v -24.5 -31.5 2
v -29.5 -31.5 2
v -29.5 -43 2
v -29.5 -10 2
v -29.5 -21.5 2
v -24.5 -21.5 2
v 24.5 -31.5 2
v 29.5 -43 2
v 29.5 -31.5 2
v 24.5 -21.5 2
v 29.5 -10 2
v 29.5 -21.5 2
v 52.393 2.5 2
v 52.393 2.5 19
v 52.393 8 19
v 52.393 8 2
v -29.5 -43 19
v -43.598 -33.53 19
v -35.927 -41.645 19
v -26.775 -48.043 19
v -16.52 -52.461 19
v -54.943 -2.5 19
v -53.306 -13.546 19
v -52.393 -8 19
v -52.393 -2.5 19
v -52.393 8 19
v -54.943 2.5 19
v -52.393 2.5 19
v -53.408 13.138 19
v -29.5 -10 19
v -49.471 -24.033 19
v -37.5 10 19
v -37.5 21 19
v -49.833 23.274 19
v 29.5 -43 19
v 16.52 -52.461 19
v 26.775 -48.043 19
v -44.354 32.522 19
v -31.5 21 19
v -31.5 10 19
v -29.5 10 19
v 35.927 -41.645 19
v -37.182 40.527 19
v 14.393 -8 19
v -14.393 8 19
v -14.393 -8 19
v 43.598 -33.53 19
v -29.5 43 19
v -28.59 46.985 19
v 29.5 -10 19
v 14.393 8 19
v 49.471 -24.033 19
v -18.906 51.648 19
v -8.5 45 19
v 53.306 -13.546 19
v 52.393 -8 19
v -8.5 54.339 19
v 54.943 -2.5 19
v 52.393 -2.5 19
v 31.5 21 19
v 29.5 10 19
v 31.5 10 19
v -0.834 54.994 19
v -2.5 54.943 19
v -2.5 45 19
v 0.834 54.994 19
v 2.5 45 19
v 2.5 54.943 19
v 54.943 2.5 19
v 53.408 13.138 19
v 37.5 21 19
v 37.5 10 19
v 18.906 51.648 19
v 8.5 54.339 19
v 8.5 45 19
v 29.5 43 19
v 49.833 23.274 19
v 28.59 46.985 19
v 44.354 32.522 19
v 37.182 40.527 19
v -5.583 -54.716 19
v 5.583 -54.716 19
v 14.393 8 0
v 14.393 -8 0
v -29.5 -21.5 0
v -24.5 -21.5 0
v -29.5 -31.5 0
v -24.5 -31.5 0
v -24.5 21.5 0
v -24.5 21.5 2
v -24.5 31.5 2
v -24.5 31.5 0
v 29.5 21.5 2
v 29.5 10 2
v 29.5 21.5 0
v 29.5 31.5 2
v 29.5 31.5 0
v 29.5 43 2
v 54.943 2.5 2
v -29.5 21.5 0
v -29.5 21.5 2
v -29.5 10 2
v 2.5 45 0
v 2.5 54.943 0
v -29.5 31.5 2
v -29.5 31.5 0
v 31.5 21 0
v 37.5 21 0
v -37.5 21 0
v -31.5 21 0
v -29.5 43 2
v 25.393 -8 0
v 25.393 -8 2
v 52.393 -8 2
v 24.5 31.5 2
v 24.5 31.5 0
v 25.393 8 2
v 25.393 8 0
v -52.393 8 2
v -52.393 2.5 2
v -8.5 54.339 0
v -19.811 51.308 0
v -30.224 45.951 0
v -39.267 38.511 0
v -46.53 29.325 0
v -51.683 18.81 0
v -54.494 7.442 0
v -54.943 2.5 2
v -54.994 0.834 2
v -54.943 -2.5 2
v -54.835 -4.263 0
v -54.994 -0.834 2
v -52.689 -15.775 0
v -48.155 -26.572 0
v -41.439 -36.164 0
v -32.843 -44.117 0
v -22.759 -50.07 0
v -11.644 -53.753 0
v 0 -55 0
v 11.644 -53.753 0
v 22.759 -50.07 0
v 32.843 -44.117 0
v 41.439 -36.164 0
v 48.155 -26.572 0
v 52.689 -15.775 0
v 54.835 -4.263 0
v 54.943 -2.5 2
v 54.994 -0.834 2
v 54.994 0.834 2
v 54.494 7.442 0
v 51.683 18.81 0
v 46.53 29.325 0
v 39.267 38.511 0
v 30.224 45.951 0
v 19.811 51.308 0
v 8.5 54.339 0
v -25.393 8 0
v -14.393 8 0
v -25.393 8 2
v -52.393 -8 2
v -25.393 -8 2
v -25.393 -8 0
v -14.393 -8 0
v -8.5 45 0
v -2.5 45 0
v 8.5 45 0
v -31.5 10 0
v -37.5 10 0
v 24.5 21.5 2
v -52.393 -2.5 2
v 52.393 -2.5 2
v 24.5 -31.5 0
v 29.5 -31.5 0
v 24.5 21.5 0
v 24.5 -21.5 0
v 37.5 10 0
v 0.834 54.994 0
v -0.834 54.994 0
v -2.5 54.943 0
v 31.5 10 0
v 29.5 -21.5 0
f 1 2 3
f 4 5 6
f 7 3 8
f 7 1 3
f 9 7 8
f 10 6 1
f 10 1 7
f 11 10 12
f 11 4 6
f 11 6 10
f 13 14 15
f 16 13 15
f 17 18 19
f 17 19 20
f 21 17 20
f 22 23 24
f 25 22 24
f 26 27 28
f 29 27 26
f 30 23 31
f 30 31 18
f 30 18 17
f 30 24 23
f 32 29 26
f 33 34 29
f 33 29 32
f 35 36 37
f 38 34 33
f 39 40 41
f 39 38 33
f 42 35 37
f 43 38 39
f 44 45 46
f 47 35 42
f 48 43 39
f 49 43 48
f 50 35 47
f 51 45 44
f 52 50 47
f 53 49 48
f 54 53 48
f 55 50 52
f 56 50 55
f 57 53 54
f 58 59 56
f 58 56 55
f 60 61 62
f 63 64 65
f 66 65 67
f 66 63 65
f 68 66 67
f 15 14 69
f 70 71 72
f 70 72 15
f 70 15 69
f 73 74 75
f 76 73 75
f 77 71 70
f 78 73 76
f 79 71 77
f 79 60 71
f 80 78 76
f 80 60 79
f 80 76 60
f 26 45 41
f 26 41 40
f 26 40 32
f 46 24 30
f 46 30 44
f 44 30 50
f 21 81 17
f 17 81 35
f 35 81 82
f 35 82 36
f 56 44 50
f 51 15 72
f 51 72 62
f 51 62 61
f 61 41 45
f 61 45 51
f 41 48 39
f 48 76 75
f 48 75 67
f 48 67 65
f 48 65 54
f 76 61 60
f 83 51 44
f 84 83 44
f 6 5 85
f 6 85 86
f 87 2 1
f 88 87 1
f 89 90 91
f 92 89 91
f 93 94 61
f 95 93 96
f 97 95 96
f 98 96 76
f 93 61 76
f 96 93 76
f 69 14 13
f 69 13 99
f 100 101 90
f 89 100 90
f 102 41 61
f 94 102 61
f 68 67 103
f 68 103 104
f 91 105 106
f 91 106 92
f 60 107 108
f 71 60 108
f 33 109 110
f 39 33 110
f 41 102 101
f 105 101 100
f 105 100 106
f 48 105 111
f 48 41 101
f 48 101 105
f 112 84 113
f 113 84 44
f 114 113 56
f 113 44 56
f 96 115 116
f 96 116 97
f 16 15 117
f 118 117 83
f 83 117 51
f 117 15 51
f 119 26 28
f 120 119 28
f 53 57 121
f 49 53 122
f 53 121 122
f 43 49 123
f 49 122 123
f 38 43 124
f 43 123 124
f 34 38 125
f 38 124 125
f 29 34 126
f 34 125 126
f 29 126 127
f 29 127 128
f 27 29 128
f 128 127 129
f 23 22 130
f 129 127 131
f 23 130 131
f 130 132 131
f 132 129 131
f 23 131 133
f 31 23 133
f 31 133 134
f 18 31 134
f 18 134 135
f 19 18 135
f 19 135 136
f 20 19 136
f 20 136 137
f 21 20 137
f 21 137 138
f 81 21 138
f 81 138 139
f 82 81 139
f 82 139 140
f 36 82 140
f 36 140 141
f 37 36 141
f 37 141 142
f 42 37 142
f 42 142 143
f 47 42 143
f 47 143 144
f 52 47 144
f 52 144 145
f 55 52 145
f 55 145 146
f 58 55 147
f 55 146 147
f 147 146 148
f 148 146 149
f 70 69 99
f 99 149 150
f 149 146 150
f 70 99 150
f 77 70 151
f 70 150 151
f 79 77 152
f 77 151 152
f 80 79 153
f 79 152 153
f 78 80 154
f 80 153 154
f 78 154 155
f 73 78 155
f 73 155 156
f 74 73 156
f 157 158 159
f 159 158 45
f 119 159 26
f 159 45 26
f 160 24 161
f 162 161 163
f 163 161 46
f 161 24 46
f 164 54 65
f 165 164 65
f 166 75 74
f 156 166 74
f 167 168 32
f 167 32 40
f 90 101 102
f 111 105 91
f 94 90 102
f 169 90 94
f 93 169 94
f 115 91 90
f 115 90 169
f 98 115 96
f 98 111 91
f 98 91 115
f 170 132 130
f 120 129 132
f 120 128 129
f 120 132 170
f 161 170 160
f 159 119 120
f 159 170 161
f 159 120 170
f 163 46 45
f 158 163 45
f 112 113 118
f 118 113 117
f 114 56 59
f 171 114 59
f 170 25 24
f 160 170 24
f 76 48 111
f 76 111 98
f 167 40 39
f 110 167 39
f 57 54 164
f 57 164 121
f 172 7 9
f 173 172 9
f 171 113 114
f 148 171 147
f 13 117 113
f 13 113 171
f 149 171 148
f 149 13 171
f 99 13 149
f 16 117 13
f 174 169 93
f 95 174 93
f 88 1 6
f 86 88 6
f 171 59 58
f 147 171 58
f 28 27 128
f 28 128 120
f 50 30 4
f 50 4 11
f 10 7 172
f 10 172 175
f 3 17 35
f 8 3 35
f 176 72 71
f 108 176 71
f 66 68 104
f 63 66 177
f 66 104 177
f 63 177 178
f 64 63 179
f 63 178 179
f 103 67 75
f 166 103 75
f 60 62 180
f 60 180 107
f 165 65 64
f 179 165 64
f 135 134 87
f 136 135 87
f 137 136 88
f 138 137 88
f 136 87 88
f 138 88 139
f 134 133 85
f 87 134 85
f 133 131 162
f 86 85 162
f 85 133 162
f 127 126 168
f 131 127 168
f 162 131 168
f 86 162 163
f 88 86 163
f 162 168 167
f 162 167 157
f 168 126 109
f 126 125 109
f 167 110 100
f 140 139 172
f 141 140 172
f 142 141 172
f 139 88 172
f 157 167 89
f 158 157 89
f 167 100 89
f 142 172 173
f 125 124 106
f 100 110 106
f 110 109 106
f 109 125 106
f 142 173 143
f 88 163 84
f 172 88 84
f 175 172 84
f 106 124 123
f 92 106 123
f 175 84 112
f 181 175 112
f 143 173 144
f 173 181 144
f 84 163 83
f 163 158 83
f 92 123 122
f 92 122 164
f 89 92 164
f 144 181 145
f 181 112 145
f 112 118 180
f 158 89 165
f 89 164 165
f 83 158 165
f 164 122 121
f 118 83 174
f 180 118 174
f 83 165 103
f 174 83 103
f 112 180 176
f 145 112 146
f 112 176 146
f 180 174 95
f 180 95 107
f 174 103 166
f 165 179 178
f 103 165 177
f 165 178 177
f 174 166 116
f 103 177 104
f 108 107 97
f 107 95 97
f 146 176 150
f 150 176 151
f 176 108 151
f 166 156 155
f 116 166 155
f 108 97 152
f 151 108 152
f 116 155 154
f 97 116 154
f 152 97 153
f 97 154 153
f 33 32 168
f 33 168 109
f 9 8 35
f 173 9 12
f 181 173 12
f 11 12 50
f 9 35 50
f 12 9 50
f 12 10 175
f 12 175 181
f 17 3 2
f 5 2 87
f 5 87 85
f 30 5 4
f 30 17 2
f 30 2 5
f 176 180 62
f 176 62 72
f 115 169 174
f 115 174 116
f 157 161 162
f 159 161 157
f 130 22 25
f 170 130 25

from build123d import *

# Parameters (mm, degrees)
F0_R     = 55
F1_DEPTH = 19
F2_W     = 5.214504
F2_H     = 5
F2_W_2   = 59
F2_H_2   = 33
F3_DEPTH = 17
F4_W     = 6
F4_H     = 11
F4_W_2   = 11
F4_H_2   = 16
F4_W_3   = 5
F4_H_3   = 10
F5_DEPTH = 19.001


with BuildPart() as f1:
    # F0 (on Top) → F1 (new body)
    with BuildSketch(Plane.XY):
        Circle(F0_R)
    extrude(amount=F1_DEPTH)

    # F2 (on face) → F3 (cut)
    with BuildSketch(Plane.XY.offset(19)):
        Polygon((52.392748, 2.5), (52.392748, 8), (14.392748, 8), (14.392748, -8), (52.392748, -8), (52.392748, -2.5), align=None)
        with Locations((55, 0)):
            Rectangle(F2_W, F2_H)
        with Locations((0, 26.5)):
            Rectangle(F2_W_2, F2_H_2)
        with Locations((0, -26.5)):
            Rectangle(F2_W_2, F2_H_2)
        Polygon((-14.392748, 8), (-52.392748, 8), (-52.392748, 2.5), (-52.392748, -2.5), (-52.392748, -8), (-14.392748, -8), align=None)
        with Locations((-55, 0)):
            Rectangle(F2_W, F2_H)
    extrude(amount=-F3_DEPTH, mode=Mode.SUBTRACT)

    # F4 (on face) → F5 (cut, through all)
    with BuildSketch(Plane.XY.offset(19)):
        with Locations((-34.5, 15.5)):
            Rectangle(F4_W, F4_H)
        with Locations((34.5, 15.5)):
            Rectangle(F4_W, F4_H)
        with Locations((-5.5, 50.5)):
            Rectangle(F4_W, F4_H)
        with Locations((5.5, 50.5)):
            Rectangle(F4_W, F4_H)
        with Locations((-19.892748, 0)):
            Rectangle(F4_W_2, F4_H_2)
        with Locations((19.892748, 0)):
            Rectangle(F4_W_2, F4_H_2)
        with Locations((27, 26.5)):
            Rectangle(F4_W_3, F4_H_3)
        with Locations((-27, 26.5)):
            Rectangle(F4_W_3, F4_H_3)
        with Locations((27, -26.5)):
            Rectangle(F4_W_3, F4_H_3)
        with Locations((-27, -26.5)):
            Rectangle(F4_W_3, F4_H_3)
    extrude(amount=-F5_DEPTH, mode=Mode.SUBTRACT)


solid = f1.part
